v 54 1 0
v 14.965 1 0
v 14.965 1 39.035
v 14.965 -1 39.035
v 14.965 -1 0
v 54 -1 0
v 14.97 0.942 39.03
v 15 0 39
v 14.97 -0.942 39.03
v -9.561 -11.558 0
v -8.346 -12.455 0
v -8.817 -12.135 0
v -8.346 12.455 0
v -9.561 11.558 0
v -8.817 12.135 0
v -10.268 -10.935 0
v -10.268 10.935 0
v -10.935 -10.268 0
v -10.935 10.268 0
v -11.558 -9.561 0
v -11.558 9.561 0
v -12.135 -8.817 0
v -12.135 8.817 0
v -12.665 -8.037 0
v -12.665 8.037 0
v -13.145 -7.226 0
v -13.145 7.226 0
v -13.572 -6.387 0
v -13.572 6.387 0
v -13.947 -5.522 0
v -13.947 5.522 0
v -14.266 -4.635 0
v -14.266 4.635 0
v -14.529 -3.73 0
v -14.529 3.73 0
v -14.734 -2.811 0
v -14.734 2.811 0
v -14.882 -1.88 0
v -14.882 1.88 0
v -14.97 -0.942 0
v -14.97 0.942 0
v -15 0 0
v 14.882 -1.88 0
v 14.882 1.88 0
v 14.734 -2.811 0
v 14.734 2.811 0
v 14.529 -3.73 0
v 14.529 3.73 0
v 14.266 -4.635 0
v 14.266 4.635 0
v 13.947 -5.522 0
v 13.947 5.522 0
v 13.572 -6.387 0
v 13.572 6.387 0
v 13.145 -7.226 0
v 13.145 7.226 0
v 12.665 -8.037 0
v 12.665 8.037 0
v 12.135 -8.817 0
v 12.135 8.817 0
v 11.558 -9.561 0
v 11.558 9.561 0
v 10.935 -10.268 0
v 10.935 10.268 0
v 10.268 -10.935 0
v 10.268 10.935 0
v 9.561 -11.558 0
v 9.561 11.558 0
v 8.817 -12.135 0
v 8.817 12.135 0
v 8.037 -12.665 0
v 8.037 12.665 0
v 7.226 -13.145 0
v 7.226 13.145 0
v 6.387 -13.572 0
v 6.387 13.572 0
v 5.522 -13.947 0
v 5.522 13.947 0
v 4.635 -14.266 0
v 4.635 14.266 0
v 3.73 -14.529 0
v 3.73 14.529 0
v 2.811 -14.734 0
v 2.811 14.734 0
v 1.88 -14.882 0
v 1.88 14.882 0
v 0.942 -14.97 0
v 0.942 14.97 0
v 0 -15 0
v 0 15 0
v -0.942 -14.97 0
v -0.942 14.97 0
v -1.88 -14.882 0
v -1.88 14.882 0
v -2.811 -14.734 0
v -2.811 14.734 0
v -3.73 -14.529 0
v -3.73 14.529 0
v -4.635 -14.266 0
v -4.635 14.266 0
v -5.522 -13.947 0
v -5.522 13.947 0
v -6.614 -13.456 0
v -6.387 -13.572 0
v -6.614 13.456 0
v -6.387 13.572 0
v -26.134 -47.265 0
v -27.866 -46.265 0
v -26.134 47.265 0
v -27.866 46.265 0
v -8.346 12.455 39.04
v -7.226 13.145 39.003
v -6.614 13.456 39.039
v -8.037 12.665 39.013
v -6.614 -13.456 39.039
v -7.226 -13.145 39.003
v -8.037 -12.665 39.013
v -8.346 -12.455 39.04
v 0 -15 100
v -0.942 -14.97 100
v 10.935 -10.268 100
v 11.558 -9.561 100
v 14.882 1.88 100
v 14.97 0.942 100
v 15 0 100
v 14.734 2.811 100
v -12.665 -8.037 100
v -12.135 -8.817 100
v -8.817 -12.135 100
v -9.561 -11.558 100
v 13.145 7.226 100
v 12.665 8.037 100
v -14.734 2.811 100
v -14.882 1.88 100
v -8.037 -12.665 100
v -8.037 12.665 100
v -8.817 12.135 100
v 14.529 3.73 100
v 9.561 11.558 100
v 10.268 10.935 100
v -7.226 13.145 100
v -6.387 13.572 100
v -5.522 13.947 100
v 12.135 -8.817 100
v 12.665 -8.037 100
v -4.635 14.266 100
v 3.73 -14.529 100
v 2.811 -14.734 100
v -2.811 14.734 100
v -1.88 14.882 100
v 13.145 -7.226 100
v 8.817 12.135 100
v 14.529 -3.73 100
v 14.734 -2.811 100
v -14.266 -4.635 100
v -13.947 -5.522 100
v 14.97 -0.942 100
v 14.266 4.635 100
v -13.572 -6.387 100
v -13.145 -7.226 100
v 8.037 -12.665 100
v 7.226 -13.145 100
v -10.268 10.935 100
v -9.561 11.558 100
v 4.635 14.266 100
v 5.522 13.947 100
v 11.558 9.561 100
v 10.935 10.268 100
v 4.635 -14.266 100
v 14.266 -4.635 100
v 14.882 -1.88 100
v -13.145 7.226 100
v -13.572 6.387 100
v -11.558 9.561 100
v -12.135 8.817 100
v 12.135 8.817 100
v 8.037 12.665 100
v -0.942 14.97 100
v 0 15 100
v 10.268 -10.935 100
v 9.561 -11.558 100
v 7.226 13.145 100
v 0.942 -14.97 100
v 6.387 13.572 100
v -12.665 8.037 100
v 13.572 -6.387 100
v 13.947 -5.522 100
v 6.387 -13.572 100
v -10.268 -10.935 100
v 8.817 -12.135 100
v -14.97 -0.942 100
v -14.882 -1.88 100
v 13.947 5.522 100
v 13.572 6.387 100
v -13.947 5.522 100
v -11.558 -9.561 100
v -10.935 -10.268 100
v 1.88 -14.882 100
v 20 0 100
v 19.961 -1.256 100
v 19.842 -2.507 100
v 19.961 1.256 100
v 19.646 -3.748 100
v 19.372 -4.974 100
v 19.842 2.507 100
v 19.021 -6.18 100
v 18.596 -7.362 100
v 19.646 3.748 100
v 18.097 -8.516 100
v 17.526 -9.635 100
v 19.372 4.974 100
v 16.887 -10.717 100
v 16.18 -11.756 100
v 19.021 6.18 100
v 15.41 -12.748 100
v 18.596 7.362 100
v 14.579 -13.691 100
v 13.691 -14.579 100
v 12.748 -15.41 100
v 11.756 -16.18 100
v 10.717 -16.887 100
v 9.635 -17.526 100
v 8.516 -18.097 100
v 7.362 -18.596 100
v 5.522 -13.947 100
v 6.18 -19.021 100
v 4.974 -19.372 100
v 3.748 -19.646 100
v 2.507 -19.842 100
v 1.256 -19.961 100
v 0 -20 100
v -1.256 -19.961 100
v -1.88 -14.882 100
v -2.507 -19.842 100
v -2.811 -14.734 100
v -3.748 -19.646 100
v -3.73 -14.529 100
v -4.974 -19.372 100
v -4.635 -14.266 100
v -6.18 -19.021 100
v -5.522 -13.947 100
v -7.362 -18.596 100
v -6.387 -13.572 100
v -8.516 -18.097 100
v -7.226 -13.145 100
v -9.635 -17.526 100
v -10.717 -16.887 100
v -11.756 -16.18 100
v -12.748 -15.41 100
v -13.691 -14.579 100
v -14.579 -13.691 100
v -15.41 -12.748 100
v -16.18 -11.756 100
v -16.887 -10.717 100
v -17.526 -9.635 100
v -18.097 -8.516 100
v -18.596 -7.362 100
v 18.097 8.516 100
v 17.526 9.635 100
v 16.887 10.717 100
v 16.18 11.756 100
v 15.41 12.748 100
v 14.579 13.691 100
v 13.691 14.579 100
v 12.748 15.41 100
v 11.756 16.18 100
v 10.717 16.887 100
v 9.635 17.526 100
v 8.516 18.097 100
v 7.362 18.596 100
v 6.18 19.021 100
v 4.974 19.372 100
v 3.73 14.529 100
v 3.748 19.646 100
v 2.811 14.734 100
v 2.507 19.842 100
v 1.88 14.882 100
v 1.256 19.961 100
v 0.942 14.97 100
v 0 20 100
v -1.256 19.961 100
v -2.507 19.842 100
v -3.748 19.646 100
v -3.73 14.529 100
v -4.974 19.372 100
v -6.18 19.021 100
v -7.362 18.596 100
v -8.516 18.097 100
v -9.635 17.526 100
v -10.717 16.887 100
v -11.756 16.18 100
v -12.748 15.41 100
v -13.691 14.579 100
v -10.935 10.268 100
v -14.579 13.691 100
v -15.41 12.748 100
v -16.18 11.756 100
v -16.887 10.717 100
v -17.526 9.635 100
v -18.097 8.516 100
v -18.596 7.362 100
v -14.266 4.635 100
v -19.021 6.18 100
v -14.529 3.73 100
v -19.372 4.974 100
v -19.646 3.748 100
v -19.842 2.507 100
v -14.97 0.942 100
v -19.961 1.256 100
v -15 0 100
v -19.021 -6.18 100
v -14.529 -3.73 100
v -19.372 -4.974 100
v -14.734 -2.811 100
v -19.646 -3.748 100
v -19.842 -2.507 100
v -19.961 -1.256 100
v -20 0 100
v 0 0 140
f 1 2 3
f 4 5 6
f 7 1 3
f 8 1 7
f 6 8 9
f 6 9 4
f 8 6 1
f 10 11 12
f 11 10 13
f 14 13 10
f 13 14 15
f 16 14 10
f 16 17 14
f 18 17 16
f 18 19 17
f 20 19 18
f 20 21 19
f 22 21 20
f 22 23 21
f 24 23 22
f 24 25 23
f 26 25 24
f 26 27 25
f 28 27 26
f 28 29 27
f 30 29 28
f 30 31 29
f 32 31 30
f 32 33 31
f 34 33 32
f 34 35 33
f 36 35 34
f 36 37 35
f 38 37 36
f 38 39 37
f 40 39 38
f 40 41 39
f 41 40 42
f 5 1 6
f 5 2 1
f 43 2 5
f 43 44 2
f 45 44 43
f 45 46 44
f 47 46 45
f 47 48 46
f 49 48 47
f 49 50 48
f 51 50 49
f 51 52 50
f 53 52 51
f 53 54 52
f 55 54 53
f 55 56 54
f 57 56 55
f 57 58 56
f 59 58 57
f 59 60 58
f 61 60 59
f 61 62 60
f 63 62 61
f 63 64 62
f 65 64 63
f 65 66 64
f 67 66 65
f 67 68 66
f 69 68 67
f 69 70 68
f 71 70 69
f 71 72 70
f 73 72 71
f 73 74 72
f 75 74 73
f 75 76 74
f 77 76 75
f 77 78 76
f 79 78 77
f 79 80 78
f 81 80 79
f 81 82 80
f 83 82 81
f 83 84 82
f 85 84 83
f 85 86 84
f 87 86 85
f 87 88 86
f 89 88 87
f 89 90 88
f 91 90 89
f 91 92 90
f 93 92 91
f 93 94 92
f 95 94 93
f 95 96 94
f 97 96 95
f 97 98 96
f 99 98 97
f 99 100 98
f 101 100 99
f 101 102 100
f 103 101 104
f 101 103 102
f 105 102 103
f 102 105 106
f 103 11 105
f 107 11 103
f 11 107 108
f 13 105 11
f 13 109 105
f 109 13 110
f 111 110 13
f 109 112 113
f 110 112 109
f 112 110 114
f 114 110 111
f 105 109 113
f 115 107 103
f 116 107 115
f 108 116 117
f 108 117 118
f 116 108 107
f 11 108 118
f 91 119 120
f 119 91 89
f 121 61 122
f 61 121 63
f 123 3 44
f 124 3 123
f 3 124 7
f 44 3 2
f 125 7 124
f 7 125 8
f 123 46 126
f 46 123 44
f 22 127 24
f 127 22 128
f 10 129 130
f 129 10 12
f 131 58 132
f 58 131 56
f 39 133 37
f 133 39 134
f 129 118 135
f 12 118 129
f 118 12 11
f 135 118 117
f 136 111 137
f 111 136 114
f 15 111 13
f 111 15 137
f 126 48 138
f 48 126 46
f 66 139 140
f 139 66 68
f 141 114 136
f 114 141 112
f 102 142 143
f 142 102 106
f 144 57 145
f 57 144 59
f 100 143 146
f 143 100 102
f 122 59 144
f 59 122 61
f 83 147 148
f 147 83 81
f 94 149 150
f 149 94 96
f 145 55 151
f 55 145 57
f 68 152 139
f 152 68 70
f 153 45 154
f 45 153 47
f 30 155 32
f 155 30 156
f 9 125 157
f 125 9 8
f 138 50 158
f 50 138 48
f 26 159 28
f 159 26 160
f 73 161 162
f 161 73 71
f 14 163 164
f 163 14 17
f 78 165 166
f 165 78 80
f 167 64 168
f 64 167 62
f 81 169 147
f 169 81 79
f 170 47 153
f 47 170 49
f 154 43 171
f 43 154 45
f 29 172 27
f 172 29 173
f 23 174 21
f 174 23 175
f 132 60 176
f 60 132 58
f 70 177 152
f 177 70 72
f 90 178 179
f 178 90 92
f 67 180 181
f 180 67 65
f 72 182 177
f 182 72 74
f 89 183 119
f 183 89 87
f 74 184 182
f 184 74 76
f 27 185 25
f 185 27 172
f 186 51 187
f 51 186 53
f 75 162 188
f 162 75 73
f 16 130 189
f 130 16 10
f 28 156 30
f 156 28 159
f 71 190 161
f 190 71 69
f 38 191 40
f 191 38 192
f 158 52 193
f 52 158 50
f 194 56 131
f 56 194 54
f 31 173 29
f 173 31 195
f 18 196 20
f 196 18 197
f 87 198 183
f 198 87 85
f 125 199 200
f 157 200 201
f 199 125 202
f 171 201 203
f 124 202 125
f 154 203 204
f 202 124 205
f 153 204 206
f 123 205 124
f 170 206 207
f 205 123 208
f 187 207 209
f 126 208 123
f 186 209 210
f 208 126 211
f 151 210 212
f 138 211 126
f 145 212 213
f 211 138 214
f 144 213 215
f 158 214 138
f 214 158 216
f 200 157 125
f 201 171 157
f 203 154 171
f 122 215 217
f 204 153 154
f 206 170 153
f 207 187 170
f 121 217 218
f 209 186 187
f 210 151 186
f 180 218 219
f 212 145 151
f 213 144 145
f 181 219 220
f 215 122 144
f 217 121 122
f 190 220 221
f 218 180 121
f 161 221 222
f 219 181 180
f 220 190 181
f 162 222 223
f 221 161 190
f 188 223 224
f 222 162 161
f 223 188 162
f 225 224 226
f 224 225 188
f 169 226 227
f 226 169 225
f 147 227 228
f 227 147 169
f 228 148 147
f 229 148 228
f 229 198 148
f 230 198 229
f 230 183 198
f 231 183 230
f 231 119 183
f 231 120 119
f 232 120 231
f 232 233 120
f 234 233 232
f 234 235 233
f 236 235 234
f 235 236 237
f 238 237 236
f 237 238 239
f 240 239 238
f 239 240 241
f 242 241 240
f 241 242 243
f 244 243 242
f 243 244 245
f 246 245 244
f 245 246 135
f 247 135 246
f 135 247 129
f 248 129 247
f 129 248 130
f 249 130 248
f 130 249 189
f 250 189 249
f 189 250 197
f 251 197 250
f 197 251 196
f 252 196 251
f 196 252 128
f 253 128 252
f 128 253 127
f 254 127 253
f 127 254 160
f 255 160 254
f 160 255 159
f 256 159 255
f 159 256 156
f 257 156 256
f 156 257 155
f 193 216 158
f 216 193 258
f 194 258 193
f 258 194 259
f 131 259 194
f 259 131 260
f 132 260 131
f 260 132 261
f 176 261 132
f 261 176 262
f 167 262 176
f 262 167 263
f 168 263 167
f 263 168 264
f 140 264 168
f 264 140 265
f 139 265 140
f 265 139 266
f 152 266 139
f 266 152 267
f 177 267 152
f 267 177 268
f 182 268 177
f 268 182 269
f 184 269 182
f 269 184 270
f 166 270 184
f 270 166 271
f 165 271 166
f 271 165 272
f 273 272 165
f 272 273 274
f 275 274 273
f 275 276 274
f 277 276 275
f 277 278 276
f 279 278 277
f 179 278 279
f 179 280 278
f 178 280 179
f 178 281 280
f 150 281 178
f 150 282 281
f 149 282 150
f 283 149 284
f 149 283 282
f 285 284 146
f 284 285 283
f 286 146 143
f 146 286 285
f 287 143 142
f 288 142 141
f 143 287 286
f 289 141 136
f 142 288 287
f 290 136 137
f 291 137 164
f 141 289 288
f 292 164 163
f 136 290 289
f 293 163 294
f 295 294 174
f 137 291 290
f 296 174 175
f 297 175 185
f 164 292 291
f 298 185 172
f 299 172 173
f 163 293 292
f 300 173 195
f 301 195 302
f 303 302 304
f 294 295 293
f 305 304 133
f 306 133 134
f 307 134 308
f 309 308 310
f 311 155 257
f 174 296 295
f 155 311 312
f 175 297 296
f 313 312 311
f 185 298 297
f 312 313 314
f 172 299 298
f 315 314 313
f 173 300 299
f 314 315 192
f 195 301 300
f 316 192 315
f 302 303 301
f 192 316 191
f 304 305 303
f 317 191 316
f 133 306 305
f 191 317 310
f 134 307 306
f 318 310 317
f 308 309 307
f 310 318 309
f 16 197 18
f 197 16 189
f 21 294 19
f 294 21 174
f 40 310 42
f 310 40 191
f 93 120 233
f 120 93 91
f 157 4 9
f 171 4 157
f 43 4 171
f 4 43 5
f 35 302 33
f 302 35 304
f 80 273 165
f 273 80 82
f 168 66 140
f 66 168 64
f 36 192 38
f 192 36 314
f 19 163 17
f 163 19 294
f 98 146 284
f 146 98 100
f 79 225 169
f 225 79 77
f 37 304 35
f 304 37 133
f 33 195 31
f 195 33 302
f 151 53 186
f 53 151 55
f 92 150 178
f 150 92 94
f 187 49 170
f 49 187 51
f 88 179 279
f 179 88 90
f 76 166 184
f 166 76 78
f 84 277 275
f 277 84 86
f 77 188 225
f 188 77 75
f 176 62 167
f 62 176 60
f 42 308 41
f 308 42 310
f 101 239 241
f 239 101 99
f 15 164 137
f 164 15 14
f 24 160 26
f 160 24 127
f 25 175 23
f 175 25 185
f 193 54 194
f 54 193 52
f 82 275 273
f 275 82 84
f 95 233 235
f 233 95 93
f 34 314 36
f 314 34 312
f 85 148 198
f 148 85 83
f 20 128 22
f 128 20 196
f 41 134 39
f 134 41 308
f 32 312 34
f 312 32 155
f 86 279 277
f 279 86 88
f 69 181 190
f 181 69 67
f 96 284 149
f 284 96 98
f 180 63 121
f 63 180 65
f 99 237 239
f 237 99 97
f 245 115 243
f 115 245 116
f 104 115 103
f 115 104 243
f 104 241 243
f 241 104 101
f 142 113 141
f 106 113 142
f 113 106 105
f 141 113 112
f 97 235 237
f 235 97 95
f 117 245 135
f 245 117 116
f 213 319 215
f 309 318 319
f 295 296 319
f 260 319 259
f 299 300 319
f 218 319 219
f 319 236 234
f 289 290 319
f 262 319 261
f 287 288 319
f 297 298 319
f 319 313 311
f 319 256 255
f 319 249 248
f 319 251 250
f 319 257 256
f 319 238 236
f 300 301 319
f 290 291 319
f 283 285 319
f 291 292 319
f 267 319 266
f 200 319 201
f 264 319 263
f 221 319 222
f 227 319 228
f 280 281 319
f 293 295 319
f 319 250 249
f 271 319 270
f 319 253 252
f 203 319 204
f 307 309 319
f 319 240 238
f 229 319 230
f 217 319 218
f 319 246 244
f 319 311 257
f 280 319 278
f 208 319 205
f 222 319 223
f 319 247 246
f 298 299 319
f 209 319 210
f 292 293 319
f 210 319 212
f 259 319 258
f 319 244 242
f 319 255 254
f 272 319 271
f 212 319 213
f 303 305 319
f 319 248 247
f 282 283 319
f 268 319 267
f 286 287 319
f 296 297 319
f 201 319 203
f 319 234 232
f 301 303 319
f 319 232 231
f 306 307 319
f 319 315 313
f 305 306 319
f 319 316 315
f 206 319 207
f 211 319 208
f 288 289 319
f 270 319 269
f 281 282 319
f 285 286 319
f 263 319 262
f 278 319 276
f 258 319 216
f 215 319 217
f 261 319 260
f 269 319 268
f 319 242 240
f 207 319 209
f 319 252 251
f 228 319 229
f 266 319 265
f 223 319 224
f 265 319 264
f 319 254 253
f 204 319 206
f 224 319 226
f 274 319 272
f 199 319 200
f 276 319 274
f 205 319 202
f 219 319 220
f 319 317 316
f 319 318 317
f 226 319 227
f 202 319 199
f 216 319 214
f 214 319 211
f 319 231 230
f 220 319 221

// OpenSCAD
// increase the visual detail
$fn = 100;

// the main body :
// a cylinder
rocket_d = 30; 				// 3 cm wide
rocket_r = rocket_d / 2;
rocket_h = 100; 			// 10 cm tall
cylinder(d = rocket_d, h = rocket_h);

// the head :
// a cone
head_d = 40;  				// 4 cm wide
head_r = head_d / 2;
head_h = 40;  				// 4 cm tall
// prepare a triangle
tri_base = head_r;
tri_height = head_h;
tri_points = [[0,			 0],
			  [tri_base,	 0],
			  [0,	tri_height]];
// rotation around X-axis and then 360° around Z-axis
// put it on top of rocket's body
translate([0,0,rocket_h])
rotate_extrude(angle = 360)
	polygon(tri_points);

// the wings :
// 3x triangles
wing_w = 2;					// 2 mm thick
many = 3;					// 3x wings
wing_l = 40;				// length
wing_h = 40;				// height
wing_points = [[0,0],[wing_l,0],[0,wing_h]];

module wing() {
	// let it a bit inside the main body
	in_by = 1;				// 1 mm
	// set it up on the rocket's perimeter
	translate([rocket_r - in_by,0,0])
	// set it upright by rotating around X-axis
	rotate([90,0,0])
	// set some width and center it
	linear_extrude(height = wing_w,center = true)
	// make a triangle
		polygon(wing_points);
}

for (i = [0: many - 1])
	rotate([0, 0, 360 / many * i])
	wing();
